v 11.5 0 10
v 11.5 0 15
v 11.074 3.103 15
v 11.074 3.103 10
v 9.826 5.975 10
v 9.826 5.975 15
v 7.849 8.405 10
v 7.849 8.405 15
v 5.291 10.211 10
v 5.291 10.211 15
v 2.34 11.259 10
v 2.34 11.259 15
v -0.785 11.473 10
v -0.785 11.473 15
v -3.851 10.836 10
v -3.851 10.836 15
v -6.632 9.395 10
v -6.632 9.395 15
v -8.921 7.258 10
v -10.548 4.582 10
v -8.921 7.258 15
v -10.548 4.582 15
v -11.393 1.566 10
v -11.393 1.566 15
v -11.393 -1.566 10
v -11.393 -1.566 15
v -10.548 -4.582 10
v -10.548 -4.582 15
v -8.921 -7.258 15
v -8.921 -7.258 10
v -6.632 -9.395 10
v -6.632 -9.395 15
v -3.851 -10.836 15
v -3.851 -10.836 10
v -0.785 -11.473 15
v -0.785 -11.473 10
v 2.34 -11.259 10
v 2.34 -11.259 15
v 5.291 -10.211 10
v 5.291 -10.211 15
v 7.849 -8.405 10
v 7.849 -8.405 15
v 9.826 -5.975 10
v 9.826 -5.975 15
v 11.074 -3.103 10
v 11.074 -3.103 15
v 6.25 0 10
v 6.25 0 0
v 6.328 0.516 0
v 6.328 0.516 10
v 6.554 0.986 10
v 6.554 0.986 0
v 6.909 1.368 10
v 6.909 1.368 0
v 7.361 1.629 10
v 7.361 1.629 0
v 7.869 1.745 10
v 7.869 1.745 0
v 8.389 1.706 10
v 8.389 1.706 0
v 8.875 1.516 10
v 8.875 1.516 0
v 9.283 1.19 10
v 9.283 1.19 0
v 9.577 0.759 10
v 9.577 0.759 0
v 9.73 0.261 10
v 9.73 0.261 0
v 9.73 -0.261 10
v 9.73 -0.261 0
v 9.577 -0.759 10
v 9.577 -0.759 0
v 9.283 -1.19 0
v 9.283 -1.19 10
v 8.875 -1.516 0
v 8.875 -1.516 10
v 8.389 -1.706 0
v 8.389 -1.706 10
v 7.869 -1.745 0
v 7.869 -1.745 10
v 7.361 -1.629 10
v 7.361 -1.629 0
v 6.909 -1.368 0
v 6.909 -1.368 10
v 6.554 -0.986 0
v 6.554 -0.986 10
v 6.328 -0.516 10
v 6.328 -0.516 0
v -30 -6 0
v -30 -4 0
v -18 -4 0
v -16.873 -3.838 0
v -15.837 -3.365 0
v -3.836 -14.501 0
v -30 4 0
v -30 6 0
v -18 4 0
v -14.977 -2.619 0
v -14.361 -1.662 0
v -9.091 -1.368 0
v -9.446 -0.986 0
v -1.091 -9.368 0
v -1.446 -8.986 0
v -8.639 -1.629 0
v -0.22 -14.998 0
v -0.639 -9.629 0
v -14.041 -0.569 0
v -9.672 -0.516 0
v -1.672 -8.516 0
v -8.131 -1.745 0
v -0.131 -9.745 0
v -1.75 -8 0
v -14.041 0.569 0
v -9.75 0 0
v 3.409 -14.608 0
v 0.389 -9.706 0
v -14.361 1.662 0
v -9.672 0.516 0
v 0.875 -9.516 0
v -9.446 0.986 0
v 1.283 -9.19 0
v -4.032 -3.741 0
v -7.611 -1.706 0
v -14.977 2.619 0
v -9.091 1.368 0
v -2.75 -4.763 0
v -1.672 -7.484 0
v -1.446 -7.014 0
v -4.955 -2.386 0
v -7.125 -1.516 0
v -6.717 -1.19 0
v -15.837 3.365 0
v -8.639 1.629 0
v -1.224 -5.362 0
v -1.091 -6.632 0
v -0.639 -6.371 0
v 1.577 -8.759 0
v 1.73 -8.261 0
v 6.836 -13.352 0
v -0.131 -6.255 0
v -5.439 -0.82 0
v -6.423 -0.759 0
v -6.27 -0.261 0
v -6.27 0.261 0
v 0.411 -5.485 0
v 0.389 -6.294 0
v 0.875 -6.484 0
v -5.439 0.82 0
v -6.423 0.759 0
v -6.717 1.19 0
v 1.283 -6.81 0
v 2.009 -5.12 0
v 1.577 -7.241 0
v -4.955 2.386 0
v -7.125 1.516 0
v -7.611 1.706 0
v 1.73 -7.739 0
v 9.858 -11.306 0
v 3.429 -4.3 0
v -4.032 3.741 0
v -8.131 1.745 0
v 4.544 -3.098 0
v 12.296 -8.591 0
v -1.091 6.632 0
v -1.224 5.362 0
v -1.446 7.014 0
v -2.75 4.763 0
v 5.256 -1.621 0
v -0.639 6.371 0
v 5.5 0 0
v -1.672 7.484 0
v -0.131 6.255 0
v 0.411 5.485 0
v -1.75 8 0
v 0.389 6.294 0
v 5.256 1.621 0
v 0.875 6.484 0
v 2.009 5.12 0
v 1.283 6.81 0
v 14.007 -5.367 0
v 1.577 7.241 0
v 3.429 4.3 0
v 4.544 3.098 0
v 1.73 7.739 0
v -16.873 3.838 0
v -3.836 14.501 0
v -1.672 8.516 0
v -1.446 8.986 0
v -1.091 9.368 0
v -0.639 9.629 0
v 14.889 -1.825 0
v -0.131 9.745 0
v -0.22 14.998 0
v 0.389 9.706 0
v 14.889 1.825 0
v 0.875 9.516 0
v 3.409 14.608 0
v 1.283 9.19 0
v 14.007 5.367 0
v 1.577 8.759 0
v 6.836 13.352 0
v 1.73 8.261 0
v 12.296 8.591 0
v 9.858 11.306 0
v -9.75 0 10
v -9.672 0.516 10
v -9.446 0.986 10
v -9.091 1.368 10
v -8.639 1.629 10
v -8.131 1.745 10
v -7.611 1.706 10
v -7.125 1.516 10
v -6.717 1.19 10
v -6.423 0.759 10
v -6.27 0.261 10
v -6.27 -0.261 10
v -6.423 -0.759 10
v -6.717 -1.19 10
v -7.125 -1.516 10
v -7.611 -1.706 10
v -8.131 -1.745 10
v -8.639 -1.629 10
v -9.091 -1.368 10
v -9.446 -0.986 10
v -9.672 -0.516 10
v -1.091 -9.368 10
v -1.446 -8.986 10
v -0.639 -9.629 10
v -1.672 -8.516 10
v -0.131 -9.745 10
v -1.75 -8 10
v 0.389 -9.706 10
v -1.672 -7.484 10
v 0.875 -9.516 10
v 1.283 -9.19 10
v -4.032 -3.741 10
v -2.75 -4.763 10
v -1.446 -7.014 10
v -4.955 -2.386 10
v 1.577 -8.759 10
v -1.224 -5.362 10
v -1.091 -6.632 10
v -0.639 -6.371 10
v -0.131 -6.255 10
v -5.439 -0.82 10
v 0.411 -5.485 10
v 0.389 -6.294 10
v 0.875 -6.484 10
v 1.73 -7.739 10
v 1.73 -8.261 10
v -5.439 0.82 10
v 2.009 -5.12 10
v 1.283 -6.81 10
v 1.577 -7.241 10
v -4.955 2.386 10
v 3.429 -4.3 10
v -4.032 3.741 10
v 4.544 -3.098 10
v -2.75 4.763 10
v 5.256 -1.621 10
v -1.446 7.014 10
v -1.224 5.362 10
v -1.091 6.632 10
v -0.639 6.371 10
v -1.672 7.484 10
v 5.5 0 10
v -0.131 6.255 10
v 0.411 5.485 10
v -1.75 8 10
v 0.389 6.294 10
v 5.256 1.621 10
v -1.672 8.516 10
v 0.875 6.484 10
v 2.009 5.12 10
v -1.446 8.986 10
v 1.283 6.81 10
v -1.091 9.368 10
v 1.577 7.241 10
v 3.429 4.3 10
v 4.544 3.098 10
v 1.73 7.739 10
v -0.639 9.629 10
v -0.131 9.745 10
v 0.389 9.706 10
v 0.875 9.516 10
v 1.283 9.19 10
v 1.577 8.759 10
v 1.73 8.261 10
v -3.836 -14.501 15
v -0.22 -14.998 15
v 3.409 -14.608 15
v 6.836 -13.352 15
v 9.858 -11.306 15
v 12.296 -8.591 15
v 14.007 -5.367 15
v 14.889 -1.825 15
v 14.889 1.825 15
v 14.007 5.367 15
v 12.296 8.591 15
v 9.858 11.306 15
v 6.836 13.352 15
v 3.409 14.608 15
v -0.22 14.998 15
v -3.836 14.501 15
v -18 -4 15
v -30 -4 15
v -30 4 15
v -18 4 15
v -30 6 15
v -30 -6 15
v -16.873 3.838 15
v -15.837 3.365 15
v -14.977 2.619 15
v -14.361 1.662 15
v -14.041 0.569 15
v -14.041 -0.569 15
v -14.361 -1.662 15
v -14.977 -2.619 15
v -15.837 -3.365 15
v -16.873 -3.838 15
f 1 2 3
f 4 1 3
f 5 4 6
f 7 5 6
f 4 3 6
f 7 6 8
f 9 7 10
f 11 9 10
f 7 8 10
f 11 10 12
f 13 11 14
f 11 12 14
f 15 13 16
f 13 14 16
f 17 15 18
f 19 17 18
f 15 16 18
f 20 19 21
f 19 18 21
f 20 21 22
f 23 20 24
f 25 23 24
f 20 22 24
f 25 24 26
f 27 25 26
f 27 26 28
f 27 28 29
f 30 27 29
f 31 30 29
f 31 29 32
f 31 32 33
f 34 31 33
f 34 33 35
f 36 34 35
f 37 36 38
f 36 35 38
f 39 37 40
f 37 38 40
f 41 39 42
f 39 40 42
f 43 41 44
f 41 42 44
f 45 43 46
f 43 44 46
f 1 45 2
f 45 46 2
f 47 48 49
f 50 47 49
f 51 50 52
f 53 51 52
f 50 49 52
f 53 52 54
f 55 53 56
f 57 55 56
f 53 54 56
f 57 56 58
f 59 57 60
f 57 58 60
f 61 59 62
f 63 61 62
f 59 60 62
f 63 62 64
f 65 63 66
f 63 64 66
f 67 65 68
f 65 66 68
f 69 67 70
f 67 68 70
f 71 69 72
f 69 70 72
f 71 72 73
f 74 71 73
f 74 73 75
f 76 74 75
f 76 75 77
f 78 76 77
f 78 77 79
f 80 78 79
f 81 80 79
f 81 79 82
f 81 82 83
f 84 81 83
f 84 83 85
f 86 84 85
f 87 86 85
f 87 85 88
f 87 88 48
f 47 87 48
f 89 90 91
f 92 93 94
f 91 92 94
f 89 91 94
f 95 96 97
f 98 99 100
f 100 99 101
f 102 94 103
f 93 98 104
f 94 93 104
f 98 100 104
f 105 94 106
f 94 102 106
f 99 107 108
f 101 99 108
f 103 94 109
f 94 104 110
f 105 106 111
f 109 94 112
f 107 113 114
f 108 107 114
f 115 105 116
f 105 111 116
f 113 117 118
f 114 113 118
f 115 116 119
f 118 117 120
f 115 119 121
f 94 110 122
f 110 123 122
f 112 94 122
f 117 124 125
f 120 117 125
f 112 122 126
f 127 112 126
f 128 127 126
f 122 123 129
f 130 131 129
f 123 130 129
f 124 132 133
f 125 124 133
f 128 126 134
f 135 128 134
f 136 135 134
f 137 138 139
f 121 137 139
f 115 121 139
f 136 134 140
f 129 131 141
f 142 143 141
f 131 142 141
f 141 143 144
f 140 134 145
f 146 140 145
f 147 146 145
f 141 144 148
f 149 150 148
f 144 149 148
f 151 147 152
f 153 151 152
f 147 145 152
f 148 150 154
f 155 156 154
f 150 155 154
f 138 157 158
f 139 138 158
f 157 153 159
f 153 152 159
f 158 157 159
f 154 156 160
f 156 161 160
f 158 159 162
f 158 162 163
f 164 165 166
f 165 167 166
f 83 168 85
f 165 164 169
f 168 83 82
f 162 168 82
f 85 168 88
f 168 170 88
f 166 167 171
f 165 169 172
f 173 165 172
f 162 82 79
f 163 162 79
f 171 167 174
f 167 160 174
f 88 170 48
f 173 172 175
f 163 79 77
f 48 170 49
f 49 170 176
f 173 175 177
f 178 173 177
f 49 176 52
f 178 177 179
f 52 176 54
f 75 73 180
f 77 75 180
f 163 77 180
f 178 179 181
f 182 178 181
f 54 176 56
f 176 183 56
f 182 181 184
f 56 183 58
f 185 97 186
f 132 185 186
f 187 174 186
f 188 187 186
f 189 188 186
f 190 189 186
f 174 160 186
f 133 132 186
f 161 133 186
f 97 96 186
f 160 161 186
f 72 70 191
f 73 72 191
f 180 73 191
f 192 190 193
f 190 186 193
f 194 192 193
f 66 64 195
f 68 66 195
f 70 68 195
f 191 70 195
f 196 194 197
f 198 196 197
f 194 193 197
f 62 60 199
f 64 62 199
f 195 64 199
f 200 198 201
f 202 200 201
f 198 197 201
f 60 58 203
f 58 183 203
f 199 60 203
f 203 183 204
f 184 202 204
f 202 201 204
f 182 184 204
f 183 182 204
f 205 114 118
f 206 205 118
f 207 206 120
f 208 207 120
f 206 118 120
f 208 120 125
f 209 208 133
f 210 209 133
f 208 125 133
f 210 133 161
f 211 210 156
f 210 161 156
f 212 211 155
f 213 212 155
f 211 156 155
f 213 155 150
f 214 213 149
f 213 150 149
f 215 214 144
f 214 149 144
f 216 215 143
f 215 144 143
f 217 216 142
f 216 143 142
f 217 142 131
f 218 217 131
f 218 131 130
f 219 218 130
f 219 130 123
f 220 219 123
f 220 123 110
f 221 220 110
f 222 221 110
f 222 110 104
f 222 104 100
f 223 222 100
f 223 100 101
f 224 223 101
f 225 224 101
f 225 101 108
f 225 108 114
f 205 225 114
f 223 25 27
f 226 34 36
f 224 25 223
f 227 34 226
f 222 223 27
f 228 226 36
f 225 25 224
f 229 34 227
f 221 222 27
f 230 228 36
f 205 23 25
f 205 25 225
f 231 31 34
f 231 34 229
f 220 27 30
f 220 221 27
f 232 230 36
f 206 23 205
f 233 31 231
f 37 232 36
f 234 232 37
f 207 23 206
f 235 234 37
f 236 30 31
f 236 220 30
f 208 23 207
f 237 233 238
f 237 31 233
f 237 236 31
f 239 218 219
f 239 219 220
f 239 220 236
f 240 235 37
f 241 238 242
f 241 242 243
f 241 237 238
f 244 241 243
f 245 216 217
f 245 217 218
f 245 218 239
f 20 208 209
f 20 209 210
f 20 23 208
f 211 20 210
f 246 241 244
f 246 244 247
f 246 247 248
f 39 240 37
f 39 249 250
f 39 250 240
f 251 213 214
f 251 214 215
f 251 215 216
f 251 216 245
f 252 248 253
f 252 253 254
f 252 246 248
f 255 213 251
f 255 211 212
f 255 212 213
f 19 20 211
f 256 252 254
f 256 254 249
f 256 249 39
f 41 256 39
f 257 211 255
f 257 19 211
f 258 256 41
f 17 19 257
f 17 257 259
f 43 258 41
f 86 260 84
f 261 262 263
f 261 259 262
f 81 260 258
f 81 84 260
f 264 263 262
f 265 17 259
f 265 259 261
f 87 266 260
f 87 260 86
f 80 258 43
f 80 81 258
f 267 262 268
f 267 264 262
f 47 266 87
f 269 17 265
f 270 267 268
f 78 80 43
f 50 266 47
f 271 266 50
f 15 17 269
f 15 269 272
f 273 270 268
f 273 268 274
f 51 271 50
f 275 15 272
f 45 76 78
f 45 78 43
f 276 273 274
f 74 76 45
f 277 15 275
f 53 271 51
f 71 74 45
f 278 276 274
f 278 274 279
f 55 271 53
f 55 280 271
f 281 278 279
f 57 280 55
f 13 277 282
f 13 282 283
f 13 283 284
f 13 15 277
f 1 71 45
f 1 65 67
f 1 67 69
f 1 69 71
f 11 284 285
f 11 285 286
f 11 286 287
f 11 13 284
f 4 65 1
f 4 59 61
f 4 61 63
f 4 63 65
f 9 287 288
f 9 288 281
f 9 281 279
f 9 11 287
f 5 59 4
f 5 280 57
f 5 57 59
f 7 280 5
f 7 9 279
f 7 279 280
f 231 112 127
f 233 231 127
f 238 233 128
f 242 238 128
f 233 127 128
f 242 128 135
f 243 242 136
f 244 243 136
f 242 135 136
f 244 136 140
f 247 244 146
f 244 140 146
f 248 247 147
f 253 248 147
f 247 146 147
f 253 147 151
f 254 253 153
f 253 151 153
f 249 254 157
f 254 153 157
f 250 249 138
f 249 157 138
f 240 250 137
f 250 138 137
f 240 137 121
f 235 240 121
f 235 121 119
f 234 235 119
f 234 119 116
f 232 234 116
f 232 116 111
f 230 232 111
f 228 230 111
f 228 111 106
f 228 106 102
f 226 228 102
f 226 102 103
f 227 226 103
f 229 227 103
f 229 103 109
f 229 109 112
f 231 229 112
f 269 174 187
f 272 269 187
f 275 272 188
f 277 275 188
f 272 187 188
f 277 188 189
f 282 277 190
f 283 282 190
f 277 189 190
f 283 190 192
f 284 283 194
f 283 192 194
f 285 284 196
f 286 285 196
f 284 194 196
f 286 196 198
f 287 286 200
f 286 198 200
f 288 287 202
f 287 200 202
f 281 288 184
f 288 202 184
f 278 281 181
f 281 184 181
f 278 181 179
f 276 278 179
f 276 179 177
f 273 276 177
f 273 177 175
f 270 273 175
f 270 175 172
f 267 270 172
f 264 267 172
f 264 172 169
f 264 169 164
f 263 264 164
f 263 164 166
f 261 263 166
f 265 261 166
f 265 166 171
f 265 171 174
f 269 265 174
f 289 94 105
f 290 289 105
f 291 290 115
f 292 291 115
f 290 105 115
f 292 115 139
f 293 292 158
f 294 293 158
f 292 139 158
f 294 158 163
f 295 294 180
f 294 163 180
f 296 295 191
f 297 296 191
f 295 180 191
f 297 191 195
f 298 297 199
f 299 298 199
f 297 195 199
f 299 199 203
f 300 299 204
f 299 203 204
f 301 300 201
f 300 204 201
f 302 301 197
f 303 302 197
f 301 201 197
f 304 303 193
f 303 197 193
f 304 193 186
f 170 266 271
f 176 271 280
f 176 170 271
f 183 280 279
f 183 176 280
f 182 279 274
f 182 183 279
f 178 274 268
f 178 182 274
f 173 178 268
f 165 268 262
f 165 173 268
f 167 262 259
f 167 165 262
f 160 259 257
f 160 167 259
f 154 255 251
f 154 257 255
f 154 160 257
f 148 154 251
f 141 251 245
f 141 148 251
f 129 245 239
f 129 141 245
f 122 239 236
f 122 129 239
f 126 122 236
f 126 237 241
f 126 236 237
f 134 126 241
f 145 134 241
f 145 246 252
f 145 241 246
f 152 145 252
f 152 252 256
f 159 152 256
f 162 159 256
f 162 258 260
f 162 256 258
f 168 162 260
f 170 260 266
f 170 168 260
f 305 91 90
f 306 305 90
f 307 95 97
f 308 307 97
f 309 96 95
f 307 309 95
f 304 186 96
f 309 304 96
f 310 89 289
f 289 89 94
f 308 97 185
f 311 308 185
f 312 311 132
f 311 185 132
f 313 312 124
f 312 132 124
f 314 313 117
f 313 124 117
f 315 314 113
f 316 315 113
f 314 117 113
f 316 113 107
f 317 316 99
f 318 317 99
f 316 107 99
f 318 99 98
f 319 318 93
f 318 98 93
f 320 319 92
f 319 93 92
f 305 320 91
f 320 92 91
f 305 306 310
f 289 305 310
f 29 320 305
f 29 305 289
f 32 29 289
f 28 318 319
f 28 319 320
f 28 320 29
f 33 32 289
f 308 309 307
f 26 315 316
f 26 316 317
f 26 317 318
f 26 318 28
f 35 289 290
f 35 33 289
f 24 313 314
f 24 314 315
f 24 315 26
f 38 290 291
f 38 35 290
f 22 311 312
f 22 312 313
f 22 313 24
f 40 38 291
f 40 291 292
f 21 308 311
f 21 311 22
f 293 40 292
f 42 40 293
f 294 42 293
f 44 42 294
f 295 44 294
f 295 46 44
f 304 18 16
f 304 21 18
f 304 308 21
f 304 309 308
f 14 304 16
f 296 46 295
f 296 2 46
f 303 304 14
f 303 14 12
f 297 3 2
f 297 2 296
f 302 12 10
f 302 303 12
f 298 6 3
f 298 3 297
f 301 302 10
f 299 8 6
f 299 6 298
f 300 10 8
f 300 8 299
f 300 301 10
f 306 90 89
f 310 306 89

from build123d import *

# Parameters (mm, degrees)
F0_R     = 5.5
F1_DEPTH = 15
F2_R     = 11.5
F3_DEPTH = 5
F5_D     = 3.5


with BuildPart() as f1:
    # F0 (on Top) → F1 (new body)
    with BuildSketch(Plane.XY):
        with BuildLine():
            ThreePointArc((-18, 4), (-14, 0), (-18, -4))
            Line((-18, -4), (-30, -4))
            Line((-30, -4), (-30, -6))
            Line((-30, -6), (-3.83581, -14.501261))
            ThreePointArc((-3.83581, -14.501261), (15, 0), (-3.83581, 14.501261))
            Line((-3.83581, 14.501261), (-30, 6))
            Line((-30, 6), (-30, 4))
            Line((-30, 4), (-18, 4))
        make_face()
        Circle(F0_R, mode=Mode.SUBTRACT)
    extrude(amount=F1_DEPTH)

    # F2 (on face) → F3 (cut)
    with BuildSketch(Plane.XY.offset(15)):
        Circle(F2_R)
    extrude(amount=-F3_DEPTH, mode=Mode.SUBTRACT)

    # F5 (through all)
    with Locations(Plane.XY.offset(10)):
        with Locations((0, 8), (8, 0), (0, -8), (-8, 0)):
            Hole(F5_D / 2)


solid = f1.part
